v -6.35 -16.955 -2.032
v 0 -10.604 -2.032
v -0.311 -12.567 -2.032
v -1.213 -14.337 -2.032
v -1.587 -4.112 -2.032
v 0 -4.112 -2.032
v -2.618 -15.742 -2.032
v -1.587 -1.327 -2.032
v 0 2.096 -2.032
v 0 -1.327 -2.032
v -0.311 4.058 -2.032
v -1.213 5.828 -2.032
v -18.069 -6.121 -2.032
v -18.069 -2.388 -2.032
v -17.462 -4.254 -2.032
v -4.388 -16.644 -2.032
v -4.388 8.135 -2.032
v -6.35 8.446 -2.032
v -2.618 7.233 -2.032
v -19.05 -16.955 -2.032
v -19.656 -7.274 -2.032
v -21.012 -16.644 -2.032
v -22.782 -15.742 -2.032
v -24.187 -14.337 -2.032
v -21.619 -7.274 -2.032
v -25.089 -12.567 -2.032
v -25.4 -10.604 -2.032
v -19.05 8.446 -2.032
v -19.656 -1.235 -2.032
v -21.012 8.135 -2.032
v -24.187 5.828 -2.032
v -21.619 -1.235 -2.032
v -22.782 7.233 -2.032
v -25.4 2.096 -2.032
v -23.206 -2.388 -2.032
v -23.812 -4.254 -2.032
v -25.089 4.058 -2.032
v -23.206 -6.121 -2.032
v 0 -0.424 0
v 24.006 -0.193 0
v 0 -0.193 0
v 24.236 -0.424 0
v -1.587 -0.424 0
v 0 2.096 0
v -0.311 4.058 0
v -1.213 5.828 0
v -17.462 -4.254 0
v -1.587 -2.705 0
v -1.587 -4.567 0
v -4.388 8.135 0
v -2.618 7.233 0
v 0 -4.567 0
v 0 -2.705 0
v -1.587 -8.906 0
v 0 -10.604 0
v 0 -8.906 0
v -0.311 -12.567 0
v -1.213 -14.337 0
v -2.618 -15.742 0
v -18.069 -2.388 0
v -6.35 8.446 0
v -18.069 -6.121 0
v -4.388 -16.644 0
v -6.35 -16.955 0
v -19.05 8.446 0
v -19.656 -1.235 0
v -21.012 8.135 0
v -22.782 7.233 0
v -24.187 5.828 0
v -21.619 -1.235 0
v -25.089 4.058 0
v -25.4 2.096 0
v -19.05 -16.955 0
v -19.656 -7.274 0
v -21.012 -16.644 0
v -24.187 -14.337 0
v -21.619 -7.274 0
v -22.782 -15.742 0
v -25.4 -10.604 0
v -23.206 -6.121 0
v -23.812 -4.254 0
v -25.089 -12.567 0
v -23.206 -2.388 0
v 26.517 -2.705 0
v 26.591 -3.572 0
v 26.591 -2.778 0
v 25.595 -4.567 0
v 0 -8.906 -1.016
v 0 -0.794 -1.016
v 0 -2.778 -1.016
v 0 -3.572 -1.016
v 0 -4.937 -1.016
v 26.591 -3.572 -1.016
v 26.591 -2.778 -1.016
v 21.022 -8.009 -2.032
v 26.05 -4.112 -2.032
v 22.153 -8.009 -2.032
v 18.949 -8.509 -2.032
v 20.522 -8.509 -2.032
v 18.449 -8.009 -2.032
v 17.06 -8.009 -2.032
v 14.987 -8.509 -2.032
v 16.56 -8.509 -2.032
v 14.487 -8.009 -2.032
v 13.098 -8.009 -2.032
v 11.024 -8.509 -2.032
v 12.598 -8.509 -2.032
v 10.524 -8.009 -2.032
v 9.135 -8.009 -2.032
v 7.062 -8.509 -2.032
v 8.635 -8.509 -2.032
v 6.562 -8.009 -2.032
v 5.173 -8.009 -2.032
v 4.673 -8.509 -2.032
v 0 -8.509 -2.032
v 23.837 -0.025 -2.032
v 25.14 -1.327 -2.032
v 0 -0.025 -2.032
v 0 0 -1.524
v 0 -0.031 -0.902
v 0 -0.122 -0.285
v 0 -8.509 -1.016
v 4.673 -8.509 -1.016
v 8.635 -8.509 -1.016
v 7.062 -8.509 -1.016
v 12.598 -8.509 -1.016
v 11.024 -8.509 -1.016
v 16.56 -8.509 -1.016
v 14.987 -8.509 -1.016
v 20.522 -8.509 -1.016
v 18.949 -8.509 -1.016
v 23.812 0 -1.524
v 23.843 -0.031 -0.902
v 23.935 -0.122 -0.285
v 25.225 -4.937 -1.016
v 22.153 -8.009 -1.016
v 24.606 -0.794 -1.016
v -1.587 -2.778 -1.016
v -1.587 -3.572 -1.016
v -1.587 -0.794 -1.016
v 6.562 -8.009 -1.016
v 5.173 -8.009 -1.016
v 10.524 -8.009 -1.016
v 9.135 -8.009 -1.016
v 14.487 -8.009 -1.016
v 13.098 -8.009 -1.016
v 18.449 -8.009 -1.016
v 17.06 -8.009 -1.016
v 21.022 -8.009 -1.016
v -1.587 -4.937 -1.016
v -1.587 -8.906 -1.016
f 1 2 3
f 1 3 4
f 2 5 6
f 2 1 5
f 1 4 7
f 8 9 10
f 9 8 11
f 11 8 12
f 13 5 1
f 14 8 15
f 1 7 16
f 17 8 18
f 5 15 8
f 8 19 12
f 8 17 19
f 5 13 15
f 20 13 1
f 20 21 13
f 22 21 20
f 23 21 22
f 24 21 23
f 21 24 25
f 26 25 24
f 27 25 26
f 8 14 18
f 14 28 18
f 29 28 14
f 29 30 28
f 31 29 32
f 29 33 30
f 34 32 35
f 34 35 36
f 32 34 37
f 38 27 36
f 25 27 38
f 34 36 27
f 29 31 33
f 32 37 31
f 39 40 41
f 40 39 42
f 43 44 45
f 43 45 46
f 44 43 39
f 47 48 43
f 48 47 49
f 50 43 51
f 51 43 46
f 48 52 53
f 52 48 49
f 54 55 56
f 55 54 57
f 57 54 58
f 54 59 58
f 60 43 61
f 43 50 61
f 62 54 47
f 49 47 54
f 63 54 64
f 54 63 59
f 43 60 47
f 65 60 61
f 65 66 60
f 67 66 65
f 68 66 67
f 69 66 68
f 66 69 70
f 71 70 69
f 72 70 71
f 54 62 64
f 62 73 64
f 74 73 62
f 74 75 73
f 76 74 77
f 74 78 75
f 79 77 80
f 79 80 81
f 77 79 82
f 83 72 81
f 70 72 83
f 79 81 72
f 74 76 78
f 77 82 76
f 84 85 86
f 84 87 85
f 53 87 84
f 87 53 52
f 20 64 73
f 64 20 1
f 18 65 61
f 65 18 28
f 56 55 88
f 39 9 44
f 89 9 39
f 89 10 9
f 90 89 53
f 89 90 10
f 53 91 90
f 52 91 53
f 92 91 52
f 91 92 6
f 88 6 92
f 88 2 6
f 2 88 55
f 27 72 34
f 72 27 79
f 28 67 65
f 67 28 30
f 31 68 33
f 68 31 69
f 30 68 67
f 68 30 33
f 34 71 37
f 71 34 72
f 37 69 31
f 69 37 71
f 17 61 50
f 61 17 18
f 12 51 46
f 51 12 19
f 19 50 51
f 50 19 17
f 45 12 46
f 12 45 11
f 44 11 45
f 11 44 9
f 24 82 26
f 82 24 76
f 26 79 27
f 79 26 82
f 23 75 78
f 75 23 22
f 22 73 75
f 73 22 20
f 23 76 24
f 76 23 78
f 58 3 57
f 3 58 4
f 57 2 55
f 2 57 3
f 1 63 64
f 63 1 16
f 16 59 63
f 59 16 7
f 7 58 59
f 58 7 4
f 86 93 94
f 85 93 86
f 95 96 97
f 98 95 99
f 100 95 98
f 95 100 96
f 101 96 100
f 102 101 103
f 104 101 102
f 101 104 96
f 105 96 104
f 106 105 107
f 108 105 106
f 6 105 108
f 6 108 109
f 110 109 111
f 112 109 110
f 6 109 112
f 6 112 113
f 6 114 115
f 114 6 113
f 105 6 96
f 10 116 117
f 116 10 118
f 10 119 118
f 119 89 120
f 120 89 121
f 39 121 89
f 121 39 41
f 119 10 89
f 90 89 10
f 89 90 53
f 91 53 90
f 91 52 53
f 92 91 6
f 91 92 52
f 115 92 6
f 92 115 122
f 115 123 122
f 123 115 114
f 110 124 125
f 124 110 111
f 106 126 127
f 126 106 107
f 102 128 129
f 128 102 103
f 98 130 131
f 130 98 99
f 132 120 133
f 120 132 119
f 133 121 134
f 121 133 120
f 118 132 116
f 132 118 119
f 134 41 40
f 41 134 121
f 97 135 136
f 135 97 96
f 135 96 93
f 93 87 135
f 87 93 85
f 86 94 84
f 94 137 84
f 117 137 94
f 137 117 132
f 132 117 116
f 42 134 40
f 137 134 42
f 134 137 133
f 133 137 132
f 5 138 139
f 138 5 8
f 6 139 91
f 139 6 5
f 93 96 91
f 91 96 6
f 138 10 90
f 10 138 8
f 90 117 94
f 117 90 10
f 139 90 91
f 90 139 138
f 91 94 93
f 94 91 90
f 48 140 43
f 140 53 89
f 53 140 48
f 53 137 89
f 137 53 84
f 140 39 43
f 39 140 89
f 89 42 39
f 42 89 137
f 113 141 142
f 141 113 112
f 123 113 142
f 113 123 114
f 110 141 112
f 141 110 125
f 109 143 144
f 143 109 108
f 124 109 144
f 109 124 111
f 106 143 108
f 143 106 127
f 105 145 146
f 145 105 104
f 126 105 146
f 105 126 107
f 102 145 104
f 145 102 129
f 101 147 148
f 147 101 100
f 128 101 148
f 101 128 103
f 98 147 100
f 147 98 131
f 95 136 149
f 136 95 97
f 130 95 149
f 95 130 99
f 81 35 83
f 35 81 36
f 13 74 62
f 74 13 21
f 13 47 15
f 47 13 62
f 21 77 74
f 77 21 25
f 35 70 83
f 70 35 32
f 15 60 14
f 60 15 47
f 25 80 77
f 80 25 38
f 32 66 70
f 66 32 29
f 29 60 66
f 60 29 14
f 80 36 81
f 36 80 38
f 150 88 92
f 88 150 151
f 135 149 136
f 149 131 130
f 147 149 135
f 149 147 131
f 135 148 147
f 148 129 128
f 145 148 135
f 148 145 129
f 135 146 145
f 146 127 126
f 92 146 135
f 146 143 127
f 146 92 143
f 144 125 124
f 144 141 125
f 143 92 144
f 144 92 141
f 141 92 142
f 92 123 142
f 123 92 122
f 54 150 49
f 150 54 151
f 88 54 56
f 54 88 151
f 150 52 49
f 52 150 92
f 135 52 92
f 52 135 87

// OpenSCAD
// Physical Keygen - by Nirav Patel <http://eclecti.cc>
//
// Generate a duplicate of a Schlage SC1 key by editing the last line of the file
// and entering in the key code of the lock.  If you don't know the key code,
// you can measure the key and compare the numbers at:
// http://web.archive.org/web/20050217020917fw_/http://dlaco.com/spacing/tips.htm
//
// This work is licensed under a Creative Commons Attribution 3.0 Unported License.

// Since the keys and locks I have were all designed in imperial units, the
// constants in this file will be defined in inches.  The mm function
// allows us to retain the proper size for exporting a metric ST
//1st number of key code
a = 0;
//2nd number of key code
b = 0;
//3rd number of key code
c = 0;
//4th number of key code
d = 0;
//5th number of key code
e = 0;
function mm(i) = i*25.4;

module rounded(size, r) {
    union() {
        translate([r, 0, 0]) cube([size[0]-2*r, size[1], size[2]]);
        translate([0, r, 0]) cube([size[0], size[1]-2*r, size[2]]);
        translate([r, r, 0]) cylinder(h=size[2], r=r);
        translate([size[0]-r, r, 0]) cylinder(h=size[2], r=r);
        translate([r, size[1]-r, 0]) cylinder(h=size[2], r=r);
        translate([size[0]-r, size[1]-r, 0]) cylinder(h=size[2], r=r);
    }
}

module bit() {
    w = mm(1/4);
    difference() {
        translate([-w/2, 0, 0]) cube([w, mm(1), w]);
        translate([-mm(7/256), 0, 0]) rotate([0, 0, 135]) cube([w, w, w]);
         translate([mm(7/256), 0, 0]) rotate([0, 0, -45]) cube([w, w, w]);
    }
}

// Schlage SC1 5 pin key.  The measurements are mostly guesses based on reverse
// engineering some keys I have and some publicly available information.
module sc1(bits) {
    // You may need to adjust these to fit your specific printer settings
    thickness = mm(0.080);
    length = mm(17/16);
    width = mm(.335);
    
    shoulder = mm(.231);
    pin_spacing = mm(.156);
    depth_inc = mm(.015);
    
    // A fudge factor.  Printing with your average RepRap, the bottom layer is
    // going to be squeezed larger than you want. You can make the pins
    // go slighly deeper by a fudge amount to make up for it if you aren't
    // adjusting for it elsewhere like Skeinforge or in your firmware.
    // 0.5mm works well for me.
    fudge = 0.5;
    
    // Handle size
    h_l = mm(1);
    h_w = mm(1);
    h_d = mm(1/16);
    difference() {
        // blade and key handle
        union() {
            translate([-h_l, -h_w/2 + width/2, 0]) rounded([h_l, h_w, thickness], mm(1/4));
            intersection() {
                // cut a little off the tip to avoid going too long
                cube([length - mm(1/64), width, thickness]);
                translate([0, mm(1/4), thickness*3/4]) rotate([0, 90, 0]) cylinder(h=length, r=mm(1/4), $fn=64);
            }
        }
        
        // chamfer the tip
        translate([length, mm(1/8), 0]) {
            rotate([0, 0, 45]) cube([10, 10, thickness]);
            rotate([0, 0, 225]) cube([10, 10, thickness]);
        }
        
        // put in a hole for keychain use
        translate([-h_l + mm(3/16), width/2, 0]) cylinder(h=thickness, r=mm(1/8));
        
        // cut the channels in the key.  designed more for printability than accuracy
        union() {
            translate([-h_d, mm(9/64), thickness/2]) rotate([62, 0, 0]) cube([length + h_d, width, width]);
            translate([-h_d, mm(7/64), thickness/2]) rotate([55, 0, 0]) cube([length + h_d, width, width]);
            translate([-h_d, mm(7/64), thickness/2]) cube([length + h_d, mm(1/32), width]);
        }
        
        translate([-h_d, width - mm(9/64), 0]) cube([length + h_d, width - (width - mm(10/64)), thickness/2]);
        translate([-h_d, width - mm(9/64), thickness/2]) rotate([-110, 0, 0]) cube([length + h_d, width, thickness/2]);
        
        intersection() {
            translate([-h_d, mm(1/32), thickness/2]) rotate([-118, 0, 0]) cube([length + h_d, width, width]);
            translate([-h_d, mm(1/32), thickness/2]) rotate([-110, 0, 0]) cube([length + h_d, width, width]);
        }
        
        // Do the actual bitting
        for (b = [0:4]) {
            translate([shoulder + b*pin_spacing, width - bits[b]*depth_inc - fudge, 0]) bit();
        }
    }
}

// This sample key goes to a lock that is sitting disassembled on my desk
// Flip the key over for easy printing

rotate([180, 0, 0]) sc1([a,b,c,d,e]);
